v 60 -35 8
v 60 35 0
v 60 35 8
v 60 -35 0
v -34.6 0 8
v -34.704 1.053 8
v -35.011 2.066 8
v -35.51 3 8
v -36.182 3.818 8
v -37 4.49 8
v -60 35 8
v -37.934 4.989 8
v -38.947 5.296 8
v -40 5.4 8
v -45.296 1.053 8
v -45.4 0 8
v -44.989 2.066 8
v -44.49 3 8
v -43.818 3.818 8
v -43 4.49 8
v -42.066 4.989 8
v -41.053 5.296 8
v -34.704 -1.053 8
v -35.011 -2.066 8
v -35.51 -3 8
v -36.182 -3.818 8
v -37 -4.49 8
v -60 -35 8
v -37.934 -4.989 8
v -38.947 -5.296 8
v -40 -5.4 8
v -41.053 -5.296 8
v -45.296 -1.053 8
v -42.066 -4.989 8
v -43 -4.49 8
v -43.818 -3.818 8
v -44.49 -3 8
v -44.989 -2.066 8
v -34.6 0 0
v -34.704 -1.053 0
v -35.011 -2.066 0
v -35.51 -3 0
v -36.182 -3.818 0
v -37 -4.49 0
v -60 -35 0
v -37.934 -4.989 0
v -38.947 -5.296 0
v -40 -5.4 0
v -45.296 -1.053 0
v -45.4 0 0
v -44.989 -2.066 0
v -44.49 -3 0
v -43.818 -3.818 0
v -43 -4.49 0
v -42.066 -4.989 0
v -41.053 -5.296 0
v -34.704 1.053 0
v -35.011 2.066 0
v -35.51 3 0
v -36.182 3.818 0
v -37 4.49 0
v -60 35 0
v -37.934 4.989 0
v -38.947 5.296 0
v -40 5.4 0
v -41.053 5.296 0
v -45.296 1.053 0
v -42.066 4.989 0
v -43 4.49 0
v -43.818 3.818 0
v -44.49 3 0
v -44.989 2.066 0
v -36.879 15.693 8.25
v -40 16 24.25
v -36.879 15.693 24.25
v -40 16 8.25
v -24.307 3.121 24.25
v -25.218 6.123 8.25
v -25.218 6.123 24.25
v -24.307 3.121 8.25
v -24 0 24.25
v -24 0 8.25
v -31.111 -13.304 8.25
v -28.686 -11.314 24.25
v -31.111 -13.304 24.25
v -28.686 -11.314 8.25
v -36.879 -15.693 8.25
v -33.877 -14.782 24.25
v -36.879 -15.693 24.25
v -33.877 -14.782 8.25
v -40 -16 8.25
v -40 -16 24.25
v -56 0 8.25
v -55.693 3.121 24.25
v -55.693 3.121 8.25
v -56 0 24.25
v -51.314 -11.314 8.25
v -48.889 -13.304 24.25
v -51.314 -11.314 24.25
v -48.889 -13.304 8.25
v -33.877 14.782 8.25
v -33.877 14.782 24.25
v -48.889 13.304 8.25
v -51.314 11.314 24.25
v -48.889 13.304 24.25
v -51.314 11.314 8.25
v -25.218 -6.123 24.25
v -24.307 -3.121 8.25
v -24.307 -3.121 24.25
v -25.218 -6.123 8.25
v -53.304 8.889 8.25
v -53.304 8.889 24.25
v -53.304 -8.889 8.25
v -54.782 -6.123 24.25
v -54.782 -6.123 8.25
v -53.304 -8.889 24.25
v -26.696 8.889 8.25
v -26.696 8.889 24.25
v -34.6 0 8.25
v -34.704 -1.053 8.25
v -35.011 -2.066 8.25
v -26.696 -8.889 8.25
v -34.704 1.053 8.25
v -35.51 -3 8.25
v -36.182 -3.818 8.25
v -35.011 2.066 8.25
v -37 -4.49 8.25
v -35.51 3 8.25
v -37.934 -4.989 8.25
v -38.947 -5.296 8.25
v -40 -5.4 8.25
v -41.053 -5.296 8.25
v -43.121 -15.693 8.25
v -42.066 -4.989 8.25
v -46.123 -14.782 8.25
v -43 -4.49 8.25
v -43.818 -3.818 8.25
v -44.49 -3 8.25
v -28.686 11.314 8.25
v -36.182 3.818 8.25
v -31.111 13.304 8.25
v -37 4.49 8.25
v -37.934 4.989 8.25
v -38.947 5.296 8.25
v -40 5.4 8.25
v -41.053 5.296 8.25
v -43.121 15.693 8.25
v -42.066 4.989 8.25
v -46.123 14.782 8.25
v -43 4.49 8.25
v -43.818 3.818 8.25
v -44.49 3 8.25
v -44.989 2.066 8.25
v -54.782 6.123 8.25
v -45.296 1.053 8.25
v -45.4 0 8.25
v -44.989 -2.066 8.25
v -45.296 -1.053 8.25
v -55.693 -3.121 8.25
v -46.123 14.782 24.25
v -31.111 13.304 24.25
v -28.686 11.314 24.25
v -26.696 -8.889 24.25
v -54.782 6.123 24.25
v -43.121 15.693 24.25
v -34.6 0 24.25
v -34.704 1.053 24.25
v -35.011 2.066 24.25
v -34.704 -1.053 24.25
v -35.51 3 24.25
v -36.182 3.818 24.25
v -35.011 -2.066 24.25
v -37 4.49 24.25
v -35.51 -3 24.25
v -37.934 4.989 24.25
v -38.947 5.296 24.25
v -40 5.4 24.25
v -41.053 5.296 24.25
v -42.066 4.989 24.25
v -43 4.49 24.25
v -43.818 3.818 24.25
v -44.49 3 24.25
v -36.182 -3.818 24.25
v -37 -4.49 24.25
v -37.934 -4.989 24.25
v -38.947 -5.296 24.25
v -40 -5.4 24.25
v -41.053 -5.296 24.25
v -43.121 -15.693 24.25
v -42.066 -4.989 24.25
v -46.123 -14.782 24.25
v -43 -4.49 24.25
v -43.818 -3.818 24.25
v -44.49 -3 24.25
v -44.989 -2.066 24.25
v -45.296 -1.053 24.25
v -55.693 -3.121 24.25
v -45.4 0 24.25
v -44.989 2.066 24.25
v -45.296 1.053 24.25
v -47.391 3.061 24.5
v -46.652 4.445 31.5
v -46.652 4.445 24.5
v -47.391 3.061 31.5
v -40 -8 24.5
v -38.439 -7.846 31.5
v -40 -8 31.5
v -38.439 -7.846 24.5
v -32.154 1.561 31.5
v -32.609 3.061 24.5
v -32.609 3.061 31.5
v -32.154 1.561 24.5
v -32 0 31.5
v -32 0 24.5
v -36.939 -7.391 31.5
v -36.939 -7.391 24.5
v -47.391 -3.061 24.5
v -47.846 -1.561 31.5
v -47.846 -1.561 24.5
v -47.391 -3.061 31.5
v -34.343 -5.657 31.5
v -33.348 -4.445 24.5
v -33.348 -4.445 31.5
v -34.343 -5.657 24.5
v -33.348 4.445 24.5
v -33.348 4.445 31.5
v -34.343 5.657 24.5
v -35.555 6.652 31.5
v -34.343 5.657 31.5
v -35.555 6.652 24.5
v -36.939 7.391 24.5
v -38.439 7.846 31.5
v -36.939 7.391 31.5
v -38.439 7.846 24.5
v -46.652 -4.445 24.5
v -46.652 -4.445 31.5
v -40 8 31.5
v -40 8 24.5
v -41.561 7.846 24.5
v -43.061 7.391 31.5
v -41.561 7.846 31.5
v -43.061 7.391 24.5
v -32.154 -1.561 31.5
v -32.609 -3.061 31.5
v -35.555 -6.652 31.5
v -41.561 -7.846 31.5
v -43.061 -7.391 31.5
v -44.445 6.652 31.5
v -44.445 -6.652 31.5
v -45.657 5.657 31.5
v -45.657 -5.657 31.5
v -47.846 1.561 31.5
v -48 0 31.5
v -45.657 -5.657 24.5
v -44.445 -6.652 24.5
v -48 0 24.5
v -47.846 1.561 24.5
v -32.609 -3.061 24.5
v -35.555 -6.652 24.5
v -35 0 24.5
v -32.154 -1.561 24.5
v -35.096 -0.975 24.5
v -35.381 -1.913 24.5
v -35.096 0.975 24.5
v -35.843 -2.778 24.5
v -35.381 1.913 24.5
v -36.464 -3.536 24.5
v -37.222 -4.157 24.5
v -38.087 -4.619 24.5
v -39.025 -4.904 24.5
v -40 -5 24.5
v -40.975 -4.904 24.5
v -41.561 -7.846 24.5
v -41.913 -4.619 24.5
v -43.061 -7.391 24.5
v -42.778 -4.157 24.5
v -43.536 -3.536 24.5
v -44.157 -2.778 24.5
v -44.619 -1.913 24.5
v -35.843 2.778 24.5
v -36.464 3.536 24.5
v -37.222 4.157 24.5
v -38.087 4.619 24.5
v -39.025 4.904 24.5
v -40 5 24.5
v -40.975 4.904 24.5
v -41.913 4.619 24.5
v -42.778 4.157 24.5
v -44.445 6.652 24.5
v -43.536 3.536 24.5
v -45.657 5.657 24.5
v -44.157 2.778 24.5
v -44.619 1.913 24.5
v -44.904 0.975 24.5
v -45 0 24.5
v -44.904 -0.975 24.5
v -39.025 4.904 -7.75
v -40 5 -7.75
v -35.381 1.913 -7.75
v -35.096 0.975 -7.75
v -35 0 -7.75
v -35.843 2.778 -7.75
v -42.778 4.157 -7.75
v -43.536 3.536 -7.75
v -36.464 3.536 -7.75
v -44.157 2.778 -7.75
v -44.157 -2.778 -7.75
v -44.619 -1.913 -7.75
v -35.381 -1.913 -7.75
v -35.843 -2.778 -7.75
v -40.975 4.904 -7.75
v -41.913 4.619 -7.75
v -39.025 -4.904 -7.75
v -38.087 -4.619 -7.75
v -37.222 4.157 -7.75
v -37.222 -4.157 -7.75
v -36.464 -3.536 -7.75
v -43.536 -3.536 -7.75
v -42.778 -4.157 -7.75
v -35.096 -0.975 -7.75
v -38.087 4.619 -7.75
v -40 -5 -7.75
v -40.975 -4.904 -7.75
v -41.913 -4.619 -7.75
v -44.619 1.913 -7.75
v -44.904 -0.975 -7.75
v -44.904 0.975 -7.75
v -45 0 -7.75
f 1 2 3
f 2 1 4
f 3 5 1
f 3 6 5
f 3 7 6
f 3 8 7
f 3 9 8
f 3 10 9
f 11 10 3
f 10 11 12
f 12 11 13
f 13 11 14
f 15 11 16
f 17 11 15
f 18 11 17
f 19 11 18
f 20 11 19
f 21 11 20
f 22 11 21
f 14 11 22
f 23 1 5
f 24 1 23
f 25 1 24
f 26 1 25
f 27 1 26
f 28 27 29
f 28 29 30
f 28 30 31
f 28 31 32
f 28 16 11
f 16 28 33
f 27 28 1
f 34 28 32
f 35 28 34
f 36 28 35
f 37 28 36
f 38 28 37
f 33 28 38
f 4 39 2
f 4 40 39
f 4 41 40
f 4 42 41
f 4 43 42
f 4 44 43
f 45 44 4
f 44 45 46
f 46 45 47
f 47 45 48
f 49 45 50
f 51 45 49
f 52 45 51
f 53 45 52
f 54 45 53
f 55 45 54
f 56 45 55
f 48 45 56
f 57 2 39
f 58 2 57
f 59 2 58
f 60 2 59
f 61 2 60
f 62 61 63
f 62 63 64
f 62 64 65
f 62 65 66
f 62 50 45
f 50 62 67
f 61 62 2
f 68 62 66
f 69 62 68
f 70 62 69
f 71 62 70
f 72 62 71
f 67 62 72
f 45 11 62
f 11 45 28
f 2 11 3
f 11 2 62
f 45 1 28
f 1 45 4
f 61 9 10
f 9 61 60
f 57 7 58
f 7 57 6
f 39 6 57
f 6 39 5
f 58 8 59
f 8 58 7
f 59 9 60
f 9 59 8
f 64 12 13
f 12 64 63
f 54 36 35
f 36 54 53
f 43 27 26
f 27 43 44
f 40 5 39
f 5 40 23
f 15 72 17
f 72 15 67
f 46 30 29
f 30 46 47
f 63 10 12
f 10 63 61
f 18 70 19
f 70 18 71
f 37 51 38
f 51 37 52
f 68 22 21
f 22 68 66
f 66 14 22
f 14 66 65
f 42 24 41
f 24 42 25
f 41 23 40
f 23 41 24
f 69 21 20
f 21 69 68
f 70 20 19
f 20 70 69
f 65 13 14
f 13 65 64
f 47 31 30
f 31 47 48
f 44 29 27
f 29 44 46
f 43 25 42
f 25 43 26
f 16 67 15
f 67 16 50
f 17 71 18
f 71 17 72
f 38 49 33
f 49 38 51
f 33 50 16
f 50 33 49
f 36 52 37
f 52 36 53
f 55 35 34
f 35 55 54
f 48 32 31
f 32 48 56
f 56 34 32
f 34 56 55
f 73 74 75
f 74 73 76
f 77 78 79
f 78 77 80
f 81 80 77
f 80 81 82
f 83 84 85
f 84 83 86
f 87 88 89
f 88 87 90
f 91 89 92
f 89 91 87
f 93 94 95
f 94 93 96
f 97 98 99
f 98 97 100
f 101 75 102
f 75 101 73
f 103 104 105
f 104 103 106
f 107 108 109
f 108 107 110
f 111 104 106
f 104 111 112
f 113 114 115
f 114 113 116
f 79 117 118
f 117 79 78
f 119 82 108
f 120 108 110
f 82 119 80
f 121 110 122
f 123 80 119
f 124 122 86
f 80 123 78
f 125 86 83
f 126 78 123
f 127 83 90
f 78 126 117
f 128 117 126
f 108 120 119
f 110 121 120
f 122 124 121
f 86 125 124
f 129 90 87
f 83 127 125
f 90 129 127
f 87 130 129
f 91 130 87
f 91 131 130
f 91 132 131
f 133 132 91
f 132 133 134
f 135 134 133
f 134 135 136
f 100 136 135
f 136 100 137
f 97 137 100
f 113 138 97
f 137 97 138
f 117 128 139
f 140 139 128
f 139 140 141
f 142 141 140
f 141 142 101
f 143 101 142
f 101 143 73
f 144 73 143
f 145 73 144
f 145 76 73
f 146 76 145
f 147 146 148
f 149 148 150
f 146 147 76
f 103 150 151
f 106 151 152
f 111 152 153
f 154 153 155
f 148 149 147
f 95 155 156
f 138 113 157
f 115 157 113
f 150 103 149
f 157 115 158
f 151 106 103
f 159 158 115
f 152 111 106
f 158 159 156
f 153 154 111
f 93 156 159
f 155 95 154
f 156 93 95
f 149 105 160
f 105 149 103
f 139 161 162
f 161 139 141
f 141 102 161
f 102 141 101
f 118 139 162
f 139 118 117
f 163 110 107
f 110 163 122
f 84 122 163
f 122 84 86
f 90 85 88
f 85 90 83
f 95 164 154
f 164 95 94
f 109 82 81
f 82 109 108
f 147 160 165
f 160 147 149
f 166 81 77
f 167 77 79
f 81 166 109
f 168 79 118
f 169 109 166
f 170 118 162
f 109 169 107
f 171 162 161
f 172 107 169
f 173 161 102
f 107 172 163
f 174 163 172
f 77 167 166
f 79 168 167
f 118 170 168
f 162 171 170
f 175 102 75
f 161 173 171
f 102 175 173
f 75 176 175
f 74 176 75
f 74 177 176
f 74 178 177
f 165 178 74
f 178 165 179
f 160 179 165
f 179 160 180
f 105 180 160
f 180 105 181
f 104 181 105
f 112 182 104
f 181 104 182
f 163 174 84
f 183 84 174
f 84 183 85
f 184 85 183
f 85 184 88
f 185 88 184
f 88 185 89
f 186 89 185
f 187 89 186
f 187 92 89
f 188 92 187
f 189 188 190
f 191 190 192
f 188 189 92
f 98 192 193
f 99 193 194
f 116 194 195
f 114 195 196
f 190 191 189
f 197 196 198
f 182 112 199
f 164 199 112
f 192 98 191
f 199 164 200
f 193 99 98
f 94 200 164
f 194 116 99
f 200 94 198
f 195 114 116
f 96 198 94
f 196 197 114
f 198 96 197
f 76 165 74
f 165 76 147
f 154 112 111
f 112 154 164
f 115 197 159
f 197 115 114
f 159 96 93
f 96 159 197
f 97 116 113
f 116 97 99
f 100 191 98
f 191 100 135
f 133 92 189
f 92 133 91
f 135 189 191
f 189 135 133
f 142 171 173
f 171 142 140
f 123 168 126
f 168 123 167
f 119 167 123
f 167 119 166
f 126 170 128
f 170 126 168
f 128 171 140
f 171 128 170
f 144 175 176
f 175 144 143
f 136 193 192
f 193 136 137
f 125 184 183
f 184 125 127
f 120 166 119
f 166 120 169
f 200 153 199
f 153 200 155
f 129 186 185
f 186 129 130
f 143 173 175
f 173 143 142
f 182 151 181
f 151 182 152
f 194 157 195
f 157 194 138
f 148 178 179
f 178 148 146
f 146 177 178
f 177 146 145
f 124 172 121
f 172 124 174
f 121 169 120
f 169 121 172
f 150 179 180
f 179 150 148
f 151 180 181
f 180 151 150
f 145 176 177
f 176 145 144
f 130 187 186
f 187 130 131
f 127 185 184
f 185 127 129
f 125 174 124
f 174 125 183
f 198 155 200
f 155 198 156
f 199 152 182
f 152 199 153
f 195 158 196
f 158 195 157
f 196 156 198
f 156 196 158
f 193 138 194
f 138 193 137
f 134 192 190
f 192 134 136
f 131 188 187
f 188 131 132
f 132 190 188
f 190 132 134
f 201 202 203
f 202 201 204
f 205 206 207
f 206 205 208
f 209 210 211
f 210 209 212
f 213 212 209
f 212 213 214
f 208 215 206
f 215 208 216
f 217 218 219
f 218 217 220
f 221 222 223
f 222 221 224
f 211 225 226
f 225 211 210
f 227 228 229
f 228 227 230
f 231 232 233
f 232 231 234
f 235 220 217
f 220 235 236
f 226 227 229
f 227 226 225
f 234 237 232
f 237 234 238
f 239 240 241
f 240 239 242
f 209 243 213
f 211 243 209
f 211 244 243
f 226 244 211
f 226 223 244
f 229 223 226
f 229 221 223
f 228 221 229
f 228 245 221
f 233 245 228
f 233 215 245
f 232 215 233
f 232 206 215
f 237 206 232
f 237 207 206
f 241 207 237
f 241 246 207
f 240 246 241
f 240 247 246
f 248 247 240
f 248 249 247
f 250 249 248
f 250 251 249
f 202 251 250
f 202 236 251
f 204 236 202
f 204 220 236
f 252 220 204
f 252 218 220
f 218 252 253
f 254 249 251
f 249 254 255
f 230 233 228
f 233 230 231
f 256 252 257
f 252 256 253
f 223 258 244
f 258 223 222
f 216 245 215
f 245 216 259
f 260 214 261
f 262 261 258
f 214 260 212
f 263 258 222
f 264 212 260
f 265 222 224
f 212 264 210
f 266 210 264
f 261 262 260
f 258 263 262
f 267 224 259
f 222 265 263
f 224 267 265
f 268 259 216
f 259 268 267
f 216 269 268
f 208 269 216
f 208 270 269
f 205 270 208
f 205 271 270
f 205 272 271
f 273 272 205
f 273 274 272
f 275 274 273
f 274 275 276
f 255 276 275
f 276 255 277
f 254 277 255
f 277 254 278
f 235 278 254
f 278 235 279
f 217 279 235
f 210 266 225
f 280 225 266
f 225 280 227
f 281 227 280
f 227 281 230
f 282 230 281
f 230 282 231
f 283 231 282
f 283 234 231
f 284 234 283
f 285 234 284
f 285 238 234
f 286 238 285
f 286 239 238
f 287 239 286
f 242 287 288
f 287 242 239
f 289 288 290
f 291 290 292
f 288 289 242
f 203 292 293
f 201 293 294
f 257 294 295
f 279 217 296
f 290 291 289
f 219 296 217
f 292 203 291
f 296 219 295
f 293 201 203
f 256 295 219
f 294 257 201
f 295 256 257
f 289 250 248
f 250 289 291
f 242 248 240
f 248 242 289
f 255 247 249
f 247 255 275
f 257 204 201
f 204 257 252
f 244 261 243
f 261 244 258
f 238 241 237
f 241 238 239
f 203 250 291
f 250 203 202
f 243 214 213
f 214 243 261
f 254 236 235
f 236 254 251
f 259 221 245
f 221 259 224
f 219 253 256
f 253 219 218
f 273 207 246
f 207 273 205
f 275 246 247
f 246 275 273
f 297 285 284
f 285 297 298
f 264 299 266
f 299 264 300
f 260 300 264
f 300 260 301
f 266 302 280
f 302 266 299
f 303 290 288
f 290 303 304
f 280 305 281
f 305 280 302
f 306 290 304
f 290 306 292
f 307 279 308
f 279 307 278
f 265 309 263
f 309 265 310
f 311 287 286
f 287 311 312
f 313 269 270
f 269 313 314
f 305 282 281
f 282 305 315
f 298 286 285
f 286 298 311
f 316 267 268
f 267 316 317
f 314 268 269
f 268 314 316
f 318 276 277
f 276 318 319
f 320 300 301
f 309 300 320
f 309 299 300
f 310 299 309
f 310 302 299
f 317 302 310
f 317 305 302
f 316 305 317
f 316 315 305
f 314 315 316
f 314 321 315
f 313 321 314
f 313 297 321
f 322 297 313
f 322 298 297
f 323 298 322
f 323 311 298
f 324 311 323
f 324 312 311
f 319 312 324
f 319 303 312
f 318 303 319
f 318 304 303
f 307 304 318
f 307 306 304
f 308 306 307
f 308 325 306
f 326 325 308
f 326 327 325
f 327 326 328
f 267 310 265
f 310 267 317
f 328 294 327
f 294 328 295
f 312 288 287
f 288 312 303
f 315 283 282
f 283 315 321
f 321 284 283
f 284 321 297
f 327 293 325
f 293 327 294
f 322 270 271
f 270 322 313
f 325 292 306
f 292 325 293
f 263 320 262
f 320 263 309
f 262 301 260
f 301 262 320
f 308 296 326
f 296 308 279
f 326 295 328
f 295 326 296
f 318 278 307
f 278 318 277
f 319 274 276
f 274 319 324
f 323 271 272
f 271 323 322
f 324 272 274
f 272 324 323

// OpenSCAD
$fn = 32;

// ------------------------------------------------------------------------
// Standoff columns: 1 d32 standoffs, bolts d10
// Every part is its own module, assembly() places them once.
// ------------------------------------------------------------------------

// --- part 1 ---
module base_plate() {
  difference() {
    translate([-60, -35, 0]) cube([120, 70, 8]);
    translate([-40, 0, -1]) cylinder(h = 10, d = 10.8);
  }
}

// --- part 2 ---
module spacer() {
  difference() {
      translate([0, 0, 0]) cylinder(h = 16, d = 32);
      translate([0, 0, -1]) cylinder(h = 18, d = 10.8);
    }
}

// --- part 3 ---
module bolt() {
  cylinder(h = 7, d = 16);
  translate([0, 0, -32.25]) cylinder(h = 32.25, d = 10);
}

// --- assembly ---
module assembly() {
  translate([0, 0, 0]) rotate([0, 0, 0]) base_plate();
  translate([-40, 0, 8.25]) rotate([0, 0, 0]) spacer();
  translate([-40, 0, 24.5]) rotate([0, 0, 0]) bolt();
}

assembly();
